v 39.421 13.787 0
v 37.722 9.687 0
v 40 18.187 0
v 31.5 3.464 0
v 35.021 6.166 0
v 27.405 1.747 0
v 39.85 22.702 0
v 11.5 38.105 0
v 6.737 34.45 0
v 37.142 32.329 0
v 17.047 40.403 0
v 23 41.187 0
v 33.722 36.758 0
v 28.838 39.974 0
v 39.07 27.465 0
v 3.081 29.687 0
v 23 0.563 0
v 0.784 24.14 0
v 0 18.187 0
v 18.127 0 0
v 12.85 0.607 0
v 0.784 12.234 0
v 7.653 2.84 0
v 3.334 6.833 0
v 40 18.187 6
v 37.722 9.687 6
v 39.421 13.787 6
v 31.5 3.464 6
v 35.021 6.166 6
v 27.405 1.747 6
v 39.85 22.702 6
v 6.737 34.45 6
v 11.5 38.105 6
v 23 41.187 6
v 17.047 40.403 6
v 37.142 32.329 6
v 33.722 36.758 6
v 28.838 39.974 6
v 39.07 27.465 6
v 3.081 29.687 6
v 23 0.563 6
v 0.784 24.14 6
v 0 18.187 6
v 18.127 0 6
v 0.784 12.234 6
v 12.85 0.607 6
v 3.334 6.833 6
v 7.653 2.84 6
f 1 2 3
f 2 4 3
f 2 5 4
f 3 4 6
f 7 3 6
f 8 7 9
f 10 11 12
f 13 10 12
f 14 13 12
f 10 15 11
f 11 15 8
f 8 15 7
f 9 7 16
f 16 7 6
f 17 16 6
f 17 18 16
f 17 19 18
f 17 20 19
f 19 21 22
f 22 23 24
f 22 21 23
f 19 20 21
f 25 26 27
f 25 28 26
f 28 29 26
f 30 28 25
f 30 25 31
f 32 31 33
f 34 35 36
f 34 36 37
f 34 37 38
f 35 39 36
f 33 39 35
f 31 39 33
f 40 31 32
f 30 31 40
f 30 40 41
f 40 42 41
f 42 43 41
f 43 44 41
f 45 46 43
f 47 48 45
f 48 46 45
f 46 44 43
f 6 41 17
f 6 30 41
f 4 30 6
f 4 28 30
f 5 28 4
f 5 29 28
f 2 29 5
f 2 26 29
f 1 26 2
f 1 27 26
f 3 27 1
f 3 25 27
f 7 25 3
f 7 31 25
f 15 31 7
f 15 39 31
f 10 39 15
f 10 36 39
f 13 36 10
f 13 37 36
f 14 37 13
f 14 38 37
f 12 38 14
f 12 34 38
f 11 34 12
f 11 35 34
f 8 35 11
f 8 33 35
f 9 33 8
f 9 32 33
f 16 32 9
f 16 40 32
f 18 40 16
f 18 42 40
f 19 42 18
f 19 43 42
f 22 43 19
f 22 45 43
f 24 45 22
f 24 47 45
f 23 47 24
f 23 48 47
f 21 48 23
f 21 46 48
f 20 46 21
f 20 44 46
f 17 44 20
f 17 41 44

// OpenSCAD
$fn = 32;

// ----------------------------------------------------------------------
// Cam disc: base radius 17.0 mm, lift 6.0 mm, 24 profile points
// ----------------------------------------------------------------------

// --- parameters (mm) ---
profile_height = 6;       // extrusion height
profile_points = 24;      // points of the closed outline

profile = [[40, 18.187], [39.85, 22.702], [39.07, 27.465], [37.142, 32.329], [33.722, 36.758], [28.838, 39.974], [23, 41.187], [17.047, 40.403], [11.5, 38.105], [6.737, 34.45], [3.081, 29.687], [0.784, 24.14], [0, 18.187], [0.784, 12.234], [3.334, 6.833], [7.653, 2.84], [12.85, 0.607], [18.127, 0], [23, 0.563], [27.405, 1.747], [31.5, 3.464], [35.021, 6.166], [37.722, 9.687], [39.421, 13.787]];  // single closed polygon, 24 points, counter clockwise

// --- the one profile operation ---
linear_extrude(height = profile_height) polygon(points = profile);
